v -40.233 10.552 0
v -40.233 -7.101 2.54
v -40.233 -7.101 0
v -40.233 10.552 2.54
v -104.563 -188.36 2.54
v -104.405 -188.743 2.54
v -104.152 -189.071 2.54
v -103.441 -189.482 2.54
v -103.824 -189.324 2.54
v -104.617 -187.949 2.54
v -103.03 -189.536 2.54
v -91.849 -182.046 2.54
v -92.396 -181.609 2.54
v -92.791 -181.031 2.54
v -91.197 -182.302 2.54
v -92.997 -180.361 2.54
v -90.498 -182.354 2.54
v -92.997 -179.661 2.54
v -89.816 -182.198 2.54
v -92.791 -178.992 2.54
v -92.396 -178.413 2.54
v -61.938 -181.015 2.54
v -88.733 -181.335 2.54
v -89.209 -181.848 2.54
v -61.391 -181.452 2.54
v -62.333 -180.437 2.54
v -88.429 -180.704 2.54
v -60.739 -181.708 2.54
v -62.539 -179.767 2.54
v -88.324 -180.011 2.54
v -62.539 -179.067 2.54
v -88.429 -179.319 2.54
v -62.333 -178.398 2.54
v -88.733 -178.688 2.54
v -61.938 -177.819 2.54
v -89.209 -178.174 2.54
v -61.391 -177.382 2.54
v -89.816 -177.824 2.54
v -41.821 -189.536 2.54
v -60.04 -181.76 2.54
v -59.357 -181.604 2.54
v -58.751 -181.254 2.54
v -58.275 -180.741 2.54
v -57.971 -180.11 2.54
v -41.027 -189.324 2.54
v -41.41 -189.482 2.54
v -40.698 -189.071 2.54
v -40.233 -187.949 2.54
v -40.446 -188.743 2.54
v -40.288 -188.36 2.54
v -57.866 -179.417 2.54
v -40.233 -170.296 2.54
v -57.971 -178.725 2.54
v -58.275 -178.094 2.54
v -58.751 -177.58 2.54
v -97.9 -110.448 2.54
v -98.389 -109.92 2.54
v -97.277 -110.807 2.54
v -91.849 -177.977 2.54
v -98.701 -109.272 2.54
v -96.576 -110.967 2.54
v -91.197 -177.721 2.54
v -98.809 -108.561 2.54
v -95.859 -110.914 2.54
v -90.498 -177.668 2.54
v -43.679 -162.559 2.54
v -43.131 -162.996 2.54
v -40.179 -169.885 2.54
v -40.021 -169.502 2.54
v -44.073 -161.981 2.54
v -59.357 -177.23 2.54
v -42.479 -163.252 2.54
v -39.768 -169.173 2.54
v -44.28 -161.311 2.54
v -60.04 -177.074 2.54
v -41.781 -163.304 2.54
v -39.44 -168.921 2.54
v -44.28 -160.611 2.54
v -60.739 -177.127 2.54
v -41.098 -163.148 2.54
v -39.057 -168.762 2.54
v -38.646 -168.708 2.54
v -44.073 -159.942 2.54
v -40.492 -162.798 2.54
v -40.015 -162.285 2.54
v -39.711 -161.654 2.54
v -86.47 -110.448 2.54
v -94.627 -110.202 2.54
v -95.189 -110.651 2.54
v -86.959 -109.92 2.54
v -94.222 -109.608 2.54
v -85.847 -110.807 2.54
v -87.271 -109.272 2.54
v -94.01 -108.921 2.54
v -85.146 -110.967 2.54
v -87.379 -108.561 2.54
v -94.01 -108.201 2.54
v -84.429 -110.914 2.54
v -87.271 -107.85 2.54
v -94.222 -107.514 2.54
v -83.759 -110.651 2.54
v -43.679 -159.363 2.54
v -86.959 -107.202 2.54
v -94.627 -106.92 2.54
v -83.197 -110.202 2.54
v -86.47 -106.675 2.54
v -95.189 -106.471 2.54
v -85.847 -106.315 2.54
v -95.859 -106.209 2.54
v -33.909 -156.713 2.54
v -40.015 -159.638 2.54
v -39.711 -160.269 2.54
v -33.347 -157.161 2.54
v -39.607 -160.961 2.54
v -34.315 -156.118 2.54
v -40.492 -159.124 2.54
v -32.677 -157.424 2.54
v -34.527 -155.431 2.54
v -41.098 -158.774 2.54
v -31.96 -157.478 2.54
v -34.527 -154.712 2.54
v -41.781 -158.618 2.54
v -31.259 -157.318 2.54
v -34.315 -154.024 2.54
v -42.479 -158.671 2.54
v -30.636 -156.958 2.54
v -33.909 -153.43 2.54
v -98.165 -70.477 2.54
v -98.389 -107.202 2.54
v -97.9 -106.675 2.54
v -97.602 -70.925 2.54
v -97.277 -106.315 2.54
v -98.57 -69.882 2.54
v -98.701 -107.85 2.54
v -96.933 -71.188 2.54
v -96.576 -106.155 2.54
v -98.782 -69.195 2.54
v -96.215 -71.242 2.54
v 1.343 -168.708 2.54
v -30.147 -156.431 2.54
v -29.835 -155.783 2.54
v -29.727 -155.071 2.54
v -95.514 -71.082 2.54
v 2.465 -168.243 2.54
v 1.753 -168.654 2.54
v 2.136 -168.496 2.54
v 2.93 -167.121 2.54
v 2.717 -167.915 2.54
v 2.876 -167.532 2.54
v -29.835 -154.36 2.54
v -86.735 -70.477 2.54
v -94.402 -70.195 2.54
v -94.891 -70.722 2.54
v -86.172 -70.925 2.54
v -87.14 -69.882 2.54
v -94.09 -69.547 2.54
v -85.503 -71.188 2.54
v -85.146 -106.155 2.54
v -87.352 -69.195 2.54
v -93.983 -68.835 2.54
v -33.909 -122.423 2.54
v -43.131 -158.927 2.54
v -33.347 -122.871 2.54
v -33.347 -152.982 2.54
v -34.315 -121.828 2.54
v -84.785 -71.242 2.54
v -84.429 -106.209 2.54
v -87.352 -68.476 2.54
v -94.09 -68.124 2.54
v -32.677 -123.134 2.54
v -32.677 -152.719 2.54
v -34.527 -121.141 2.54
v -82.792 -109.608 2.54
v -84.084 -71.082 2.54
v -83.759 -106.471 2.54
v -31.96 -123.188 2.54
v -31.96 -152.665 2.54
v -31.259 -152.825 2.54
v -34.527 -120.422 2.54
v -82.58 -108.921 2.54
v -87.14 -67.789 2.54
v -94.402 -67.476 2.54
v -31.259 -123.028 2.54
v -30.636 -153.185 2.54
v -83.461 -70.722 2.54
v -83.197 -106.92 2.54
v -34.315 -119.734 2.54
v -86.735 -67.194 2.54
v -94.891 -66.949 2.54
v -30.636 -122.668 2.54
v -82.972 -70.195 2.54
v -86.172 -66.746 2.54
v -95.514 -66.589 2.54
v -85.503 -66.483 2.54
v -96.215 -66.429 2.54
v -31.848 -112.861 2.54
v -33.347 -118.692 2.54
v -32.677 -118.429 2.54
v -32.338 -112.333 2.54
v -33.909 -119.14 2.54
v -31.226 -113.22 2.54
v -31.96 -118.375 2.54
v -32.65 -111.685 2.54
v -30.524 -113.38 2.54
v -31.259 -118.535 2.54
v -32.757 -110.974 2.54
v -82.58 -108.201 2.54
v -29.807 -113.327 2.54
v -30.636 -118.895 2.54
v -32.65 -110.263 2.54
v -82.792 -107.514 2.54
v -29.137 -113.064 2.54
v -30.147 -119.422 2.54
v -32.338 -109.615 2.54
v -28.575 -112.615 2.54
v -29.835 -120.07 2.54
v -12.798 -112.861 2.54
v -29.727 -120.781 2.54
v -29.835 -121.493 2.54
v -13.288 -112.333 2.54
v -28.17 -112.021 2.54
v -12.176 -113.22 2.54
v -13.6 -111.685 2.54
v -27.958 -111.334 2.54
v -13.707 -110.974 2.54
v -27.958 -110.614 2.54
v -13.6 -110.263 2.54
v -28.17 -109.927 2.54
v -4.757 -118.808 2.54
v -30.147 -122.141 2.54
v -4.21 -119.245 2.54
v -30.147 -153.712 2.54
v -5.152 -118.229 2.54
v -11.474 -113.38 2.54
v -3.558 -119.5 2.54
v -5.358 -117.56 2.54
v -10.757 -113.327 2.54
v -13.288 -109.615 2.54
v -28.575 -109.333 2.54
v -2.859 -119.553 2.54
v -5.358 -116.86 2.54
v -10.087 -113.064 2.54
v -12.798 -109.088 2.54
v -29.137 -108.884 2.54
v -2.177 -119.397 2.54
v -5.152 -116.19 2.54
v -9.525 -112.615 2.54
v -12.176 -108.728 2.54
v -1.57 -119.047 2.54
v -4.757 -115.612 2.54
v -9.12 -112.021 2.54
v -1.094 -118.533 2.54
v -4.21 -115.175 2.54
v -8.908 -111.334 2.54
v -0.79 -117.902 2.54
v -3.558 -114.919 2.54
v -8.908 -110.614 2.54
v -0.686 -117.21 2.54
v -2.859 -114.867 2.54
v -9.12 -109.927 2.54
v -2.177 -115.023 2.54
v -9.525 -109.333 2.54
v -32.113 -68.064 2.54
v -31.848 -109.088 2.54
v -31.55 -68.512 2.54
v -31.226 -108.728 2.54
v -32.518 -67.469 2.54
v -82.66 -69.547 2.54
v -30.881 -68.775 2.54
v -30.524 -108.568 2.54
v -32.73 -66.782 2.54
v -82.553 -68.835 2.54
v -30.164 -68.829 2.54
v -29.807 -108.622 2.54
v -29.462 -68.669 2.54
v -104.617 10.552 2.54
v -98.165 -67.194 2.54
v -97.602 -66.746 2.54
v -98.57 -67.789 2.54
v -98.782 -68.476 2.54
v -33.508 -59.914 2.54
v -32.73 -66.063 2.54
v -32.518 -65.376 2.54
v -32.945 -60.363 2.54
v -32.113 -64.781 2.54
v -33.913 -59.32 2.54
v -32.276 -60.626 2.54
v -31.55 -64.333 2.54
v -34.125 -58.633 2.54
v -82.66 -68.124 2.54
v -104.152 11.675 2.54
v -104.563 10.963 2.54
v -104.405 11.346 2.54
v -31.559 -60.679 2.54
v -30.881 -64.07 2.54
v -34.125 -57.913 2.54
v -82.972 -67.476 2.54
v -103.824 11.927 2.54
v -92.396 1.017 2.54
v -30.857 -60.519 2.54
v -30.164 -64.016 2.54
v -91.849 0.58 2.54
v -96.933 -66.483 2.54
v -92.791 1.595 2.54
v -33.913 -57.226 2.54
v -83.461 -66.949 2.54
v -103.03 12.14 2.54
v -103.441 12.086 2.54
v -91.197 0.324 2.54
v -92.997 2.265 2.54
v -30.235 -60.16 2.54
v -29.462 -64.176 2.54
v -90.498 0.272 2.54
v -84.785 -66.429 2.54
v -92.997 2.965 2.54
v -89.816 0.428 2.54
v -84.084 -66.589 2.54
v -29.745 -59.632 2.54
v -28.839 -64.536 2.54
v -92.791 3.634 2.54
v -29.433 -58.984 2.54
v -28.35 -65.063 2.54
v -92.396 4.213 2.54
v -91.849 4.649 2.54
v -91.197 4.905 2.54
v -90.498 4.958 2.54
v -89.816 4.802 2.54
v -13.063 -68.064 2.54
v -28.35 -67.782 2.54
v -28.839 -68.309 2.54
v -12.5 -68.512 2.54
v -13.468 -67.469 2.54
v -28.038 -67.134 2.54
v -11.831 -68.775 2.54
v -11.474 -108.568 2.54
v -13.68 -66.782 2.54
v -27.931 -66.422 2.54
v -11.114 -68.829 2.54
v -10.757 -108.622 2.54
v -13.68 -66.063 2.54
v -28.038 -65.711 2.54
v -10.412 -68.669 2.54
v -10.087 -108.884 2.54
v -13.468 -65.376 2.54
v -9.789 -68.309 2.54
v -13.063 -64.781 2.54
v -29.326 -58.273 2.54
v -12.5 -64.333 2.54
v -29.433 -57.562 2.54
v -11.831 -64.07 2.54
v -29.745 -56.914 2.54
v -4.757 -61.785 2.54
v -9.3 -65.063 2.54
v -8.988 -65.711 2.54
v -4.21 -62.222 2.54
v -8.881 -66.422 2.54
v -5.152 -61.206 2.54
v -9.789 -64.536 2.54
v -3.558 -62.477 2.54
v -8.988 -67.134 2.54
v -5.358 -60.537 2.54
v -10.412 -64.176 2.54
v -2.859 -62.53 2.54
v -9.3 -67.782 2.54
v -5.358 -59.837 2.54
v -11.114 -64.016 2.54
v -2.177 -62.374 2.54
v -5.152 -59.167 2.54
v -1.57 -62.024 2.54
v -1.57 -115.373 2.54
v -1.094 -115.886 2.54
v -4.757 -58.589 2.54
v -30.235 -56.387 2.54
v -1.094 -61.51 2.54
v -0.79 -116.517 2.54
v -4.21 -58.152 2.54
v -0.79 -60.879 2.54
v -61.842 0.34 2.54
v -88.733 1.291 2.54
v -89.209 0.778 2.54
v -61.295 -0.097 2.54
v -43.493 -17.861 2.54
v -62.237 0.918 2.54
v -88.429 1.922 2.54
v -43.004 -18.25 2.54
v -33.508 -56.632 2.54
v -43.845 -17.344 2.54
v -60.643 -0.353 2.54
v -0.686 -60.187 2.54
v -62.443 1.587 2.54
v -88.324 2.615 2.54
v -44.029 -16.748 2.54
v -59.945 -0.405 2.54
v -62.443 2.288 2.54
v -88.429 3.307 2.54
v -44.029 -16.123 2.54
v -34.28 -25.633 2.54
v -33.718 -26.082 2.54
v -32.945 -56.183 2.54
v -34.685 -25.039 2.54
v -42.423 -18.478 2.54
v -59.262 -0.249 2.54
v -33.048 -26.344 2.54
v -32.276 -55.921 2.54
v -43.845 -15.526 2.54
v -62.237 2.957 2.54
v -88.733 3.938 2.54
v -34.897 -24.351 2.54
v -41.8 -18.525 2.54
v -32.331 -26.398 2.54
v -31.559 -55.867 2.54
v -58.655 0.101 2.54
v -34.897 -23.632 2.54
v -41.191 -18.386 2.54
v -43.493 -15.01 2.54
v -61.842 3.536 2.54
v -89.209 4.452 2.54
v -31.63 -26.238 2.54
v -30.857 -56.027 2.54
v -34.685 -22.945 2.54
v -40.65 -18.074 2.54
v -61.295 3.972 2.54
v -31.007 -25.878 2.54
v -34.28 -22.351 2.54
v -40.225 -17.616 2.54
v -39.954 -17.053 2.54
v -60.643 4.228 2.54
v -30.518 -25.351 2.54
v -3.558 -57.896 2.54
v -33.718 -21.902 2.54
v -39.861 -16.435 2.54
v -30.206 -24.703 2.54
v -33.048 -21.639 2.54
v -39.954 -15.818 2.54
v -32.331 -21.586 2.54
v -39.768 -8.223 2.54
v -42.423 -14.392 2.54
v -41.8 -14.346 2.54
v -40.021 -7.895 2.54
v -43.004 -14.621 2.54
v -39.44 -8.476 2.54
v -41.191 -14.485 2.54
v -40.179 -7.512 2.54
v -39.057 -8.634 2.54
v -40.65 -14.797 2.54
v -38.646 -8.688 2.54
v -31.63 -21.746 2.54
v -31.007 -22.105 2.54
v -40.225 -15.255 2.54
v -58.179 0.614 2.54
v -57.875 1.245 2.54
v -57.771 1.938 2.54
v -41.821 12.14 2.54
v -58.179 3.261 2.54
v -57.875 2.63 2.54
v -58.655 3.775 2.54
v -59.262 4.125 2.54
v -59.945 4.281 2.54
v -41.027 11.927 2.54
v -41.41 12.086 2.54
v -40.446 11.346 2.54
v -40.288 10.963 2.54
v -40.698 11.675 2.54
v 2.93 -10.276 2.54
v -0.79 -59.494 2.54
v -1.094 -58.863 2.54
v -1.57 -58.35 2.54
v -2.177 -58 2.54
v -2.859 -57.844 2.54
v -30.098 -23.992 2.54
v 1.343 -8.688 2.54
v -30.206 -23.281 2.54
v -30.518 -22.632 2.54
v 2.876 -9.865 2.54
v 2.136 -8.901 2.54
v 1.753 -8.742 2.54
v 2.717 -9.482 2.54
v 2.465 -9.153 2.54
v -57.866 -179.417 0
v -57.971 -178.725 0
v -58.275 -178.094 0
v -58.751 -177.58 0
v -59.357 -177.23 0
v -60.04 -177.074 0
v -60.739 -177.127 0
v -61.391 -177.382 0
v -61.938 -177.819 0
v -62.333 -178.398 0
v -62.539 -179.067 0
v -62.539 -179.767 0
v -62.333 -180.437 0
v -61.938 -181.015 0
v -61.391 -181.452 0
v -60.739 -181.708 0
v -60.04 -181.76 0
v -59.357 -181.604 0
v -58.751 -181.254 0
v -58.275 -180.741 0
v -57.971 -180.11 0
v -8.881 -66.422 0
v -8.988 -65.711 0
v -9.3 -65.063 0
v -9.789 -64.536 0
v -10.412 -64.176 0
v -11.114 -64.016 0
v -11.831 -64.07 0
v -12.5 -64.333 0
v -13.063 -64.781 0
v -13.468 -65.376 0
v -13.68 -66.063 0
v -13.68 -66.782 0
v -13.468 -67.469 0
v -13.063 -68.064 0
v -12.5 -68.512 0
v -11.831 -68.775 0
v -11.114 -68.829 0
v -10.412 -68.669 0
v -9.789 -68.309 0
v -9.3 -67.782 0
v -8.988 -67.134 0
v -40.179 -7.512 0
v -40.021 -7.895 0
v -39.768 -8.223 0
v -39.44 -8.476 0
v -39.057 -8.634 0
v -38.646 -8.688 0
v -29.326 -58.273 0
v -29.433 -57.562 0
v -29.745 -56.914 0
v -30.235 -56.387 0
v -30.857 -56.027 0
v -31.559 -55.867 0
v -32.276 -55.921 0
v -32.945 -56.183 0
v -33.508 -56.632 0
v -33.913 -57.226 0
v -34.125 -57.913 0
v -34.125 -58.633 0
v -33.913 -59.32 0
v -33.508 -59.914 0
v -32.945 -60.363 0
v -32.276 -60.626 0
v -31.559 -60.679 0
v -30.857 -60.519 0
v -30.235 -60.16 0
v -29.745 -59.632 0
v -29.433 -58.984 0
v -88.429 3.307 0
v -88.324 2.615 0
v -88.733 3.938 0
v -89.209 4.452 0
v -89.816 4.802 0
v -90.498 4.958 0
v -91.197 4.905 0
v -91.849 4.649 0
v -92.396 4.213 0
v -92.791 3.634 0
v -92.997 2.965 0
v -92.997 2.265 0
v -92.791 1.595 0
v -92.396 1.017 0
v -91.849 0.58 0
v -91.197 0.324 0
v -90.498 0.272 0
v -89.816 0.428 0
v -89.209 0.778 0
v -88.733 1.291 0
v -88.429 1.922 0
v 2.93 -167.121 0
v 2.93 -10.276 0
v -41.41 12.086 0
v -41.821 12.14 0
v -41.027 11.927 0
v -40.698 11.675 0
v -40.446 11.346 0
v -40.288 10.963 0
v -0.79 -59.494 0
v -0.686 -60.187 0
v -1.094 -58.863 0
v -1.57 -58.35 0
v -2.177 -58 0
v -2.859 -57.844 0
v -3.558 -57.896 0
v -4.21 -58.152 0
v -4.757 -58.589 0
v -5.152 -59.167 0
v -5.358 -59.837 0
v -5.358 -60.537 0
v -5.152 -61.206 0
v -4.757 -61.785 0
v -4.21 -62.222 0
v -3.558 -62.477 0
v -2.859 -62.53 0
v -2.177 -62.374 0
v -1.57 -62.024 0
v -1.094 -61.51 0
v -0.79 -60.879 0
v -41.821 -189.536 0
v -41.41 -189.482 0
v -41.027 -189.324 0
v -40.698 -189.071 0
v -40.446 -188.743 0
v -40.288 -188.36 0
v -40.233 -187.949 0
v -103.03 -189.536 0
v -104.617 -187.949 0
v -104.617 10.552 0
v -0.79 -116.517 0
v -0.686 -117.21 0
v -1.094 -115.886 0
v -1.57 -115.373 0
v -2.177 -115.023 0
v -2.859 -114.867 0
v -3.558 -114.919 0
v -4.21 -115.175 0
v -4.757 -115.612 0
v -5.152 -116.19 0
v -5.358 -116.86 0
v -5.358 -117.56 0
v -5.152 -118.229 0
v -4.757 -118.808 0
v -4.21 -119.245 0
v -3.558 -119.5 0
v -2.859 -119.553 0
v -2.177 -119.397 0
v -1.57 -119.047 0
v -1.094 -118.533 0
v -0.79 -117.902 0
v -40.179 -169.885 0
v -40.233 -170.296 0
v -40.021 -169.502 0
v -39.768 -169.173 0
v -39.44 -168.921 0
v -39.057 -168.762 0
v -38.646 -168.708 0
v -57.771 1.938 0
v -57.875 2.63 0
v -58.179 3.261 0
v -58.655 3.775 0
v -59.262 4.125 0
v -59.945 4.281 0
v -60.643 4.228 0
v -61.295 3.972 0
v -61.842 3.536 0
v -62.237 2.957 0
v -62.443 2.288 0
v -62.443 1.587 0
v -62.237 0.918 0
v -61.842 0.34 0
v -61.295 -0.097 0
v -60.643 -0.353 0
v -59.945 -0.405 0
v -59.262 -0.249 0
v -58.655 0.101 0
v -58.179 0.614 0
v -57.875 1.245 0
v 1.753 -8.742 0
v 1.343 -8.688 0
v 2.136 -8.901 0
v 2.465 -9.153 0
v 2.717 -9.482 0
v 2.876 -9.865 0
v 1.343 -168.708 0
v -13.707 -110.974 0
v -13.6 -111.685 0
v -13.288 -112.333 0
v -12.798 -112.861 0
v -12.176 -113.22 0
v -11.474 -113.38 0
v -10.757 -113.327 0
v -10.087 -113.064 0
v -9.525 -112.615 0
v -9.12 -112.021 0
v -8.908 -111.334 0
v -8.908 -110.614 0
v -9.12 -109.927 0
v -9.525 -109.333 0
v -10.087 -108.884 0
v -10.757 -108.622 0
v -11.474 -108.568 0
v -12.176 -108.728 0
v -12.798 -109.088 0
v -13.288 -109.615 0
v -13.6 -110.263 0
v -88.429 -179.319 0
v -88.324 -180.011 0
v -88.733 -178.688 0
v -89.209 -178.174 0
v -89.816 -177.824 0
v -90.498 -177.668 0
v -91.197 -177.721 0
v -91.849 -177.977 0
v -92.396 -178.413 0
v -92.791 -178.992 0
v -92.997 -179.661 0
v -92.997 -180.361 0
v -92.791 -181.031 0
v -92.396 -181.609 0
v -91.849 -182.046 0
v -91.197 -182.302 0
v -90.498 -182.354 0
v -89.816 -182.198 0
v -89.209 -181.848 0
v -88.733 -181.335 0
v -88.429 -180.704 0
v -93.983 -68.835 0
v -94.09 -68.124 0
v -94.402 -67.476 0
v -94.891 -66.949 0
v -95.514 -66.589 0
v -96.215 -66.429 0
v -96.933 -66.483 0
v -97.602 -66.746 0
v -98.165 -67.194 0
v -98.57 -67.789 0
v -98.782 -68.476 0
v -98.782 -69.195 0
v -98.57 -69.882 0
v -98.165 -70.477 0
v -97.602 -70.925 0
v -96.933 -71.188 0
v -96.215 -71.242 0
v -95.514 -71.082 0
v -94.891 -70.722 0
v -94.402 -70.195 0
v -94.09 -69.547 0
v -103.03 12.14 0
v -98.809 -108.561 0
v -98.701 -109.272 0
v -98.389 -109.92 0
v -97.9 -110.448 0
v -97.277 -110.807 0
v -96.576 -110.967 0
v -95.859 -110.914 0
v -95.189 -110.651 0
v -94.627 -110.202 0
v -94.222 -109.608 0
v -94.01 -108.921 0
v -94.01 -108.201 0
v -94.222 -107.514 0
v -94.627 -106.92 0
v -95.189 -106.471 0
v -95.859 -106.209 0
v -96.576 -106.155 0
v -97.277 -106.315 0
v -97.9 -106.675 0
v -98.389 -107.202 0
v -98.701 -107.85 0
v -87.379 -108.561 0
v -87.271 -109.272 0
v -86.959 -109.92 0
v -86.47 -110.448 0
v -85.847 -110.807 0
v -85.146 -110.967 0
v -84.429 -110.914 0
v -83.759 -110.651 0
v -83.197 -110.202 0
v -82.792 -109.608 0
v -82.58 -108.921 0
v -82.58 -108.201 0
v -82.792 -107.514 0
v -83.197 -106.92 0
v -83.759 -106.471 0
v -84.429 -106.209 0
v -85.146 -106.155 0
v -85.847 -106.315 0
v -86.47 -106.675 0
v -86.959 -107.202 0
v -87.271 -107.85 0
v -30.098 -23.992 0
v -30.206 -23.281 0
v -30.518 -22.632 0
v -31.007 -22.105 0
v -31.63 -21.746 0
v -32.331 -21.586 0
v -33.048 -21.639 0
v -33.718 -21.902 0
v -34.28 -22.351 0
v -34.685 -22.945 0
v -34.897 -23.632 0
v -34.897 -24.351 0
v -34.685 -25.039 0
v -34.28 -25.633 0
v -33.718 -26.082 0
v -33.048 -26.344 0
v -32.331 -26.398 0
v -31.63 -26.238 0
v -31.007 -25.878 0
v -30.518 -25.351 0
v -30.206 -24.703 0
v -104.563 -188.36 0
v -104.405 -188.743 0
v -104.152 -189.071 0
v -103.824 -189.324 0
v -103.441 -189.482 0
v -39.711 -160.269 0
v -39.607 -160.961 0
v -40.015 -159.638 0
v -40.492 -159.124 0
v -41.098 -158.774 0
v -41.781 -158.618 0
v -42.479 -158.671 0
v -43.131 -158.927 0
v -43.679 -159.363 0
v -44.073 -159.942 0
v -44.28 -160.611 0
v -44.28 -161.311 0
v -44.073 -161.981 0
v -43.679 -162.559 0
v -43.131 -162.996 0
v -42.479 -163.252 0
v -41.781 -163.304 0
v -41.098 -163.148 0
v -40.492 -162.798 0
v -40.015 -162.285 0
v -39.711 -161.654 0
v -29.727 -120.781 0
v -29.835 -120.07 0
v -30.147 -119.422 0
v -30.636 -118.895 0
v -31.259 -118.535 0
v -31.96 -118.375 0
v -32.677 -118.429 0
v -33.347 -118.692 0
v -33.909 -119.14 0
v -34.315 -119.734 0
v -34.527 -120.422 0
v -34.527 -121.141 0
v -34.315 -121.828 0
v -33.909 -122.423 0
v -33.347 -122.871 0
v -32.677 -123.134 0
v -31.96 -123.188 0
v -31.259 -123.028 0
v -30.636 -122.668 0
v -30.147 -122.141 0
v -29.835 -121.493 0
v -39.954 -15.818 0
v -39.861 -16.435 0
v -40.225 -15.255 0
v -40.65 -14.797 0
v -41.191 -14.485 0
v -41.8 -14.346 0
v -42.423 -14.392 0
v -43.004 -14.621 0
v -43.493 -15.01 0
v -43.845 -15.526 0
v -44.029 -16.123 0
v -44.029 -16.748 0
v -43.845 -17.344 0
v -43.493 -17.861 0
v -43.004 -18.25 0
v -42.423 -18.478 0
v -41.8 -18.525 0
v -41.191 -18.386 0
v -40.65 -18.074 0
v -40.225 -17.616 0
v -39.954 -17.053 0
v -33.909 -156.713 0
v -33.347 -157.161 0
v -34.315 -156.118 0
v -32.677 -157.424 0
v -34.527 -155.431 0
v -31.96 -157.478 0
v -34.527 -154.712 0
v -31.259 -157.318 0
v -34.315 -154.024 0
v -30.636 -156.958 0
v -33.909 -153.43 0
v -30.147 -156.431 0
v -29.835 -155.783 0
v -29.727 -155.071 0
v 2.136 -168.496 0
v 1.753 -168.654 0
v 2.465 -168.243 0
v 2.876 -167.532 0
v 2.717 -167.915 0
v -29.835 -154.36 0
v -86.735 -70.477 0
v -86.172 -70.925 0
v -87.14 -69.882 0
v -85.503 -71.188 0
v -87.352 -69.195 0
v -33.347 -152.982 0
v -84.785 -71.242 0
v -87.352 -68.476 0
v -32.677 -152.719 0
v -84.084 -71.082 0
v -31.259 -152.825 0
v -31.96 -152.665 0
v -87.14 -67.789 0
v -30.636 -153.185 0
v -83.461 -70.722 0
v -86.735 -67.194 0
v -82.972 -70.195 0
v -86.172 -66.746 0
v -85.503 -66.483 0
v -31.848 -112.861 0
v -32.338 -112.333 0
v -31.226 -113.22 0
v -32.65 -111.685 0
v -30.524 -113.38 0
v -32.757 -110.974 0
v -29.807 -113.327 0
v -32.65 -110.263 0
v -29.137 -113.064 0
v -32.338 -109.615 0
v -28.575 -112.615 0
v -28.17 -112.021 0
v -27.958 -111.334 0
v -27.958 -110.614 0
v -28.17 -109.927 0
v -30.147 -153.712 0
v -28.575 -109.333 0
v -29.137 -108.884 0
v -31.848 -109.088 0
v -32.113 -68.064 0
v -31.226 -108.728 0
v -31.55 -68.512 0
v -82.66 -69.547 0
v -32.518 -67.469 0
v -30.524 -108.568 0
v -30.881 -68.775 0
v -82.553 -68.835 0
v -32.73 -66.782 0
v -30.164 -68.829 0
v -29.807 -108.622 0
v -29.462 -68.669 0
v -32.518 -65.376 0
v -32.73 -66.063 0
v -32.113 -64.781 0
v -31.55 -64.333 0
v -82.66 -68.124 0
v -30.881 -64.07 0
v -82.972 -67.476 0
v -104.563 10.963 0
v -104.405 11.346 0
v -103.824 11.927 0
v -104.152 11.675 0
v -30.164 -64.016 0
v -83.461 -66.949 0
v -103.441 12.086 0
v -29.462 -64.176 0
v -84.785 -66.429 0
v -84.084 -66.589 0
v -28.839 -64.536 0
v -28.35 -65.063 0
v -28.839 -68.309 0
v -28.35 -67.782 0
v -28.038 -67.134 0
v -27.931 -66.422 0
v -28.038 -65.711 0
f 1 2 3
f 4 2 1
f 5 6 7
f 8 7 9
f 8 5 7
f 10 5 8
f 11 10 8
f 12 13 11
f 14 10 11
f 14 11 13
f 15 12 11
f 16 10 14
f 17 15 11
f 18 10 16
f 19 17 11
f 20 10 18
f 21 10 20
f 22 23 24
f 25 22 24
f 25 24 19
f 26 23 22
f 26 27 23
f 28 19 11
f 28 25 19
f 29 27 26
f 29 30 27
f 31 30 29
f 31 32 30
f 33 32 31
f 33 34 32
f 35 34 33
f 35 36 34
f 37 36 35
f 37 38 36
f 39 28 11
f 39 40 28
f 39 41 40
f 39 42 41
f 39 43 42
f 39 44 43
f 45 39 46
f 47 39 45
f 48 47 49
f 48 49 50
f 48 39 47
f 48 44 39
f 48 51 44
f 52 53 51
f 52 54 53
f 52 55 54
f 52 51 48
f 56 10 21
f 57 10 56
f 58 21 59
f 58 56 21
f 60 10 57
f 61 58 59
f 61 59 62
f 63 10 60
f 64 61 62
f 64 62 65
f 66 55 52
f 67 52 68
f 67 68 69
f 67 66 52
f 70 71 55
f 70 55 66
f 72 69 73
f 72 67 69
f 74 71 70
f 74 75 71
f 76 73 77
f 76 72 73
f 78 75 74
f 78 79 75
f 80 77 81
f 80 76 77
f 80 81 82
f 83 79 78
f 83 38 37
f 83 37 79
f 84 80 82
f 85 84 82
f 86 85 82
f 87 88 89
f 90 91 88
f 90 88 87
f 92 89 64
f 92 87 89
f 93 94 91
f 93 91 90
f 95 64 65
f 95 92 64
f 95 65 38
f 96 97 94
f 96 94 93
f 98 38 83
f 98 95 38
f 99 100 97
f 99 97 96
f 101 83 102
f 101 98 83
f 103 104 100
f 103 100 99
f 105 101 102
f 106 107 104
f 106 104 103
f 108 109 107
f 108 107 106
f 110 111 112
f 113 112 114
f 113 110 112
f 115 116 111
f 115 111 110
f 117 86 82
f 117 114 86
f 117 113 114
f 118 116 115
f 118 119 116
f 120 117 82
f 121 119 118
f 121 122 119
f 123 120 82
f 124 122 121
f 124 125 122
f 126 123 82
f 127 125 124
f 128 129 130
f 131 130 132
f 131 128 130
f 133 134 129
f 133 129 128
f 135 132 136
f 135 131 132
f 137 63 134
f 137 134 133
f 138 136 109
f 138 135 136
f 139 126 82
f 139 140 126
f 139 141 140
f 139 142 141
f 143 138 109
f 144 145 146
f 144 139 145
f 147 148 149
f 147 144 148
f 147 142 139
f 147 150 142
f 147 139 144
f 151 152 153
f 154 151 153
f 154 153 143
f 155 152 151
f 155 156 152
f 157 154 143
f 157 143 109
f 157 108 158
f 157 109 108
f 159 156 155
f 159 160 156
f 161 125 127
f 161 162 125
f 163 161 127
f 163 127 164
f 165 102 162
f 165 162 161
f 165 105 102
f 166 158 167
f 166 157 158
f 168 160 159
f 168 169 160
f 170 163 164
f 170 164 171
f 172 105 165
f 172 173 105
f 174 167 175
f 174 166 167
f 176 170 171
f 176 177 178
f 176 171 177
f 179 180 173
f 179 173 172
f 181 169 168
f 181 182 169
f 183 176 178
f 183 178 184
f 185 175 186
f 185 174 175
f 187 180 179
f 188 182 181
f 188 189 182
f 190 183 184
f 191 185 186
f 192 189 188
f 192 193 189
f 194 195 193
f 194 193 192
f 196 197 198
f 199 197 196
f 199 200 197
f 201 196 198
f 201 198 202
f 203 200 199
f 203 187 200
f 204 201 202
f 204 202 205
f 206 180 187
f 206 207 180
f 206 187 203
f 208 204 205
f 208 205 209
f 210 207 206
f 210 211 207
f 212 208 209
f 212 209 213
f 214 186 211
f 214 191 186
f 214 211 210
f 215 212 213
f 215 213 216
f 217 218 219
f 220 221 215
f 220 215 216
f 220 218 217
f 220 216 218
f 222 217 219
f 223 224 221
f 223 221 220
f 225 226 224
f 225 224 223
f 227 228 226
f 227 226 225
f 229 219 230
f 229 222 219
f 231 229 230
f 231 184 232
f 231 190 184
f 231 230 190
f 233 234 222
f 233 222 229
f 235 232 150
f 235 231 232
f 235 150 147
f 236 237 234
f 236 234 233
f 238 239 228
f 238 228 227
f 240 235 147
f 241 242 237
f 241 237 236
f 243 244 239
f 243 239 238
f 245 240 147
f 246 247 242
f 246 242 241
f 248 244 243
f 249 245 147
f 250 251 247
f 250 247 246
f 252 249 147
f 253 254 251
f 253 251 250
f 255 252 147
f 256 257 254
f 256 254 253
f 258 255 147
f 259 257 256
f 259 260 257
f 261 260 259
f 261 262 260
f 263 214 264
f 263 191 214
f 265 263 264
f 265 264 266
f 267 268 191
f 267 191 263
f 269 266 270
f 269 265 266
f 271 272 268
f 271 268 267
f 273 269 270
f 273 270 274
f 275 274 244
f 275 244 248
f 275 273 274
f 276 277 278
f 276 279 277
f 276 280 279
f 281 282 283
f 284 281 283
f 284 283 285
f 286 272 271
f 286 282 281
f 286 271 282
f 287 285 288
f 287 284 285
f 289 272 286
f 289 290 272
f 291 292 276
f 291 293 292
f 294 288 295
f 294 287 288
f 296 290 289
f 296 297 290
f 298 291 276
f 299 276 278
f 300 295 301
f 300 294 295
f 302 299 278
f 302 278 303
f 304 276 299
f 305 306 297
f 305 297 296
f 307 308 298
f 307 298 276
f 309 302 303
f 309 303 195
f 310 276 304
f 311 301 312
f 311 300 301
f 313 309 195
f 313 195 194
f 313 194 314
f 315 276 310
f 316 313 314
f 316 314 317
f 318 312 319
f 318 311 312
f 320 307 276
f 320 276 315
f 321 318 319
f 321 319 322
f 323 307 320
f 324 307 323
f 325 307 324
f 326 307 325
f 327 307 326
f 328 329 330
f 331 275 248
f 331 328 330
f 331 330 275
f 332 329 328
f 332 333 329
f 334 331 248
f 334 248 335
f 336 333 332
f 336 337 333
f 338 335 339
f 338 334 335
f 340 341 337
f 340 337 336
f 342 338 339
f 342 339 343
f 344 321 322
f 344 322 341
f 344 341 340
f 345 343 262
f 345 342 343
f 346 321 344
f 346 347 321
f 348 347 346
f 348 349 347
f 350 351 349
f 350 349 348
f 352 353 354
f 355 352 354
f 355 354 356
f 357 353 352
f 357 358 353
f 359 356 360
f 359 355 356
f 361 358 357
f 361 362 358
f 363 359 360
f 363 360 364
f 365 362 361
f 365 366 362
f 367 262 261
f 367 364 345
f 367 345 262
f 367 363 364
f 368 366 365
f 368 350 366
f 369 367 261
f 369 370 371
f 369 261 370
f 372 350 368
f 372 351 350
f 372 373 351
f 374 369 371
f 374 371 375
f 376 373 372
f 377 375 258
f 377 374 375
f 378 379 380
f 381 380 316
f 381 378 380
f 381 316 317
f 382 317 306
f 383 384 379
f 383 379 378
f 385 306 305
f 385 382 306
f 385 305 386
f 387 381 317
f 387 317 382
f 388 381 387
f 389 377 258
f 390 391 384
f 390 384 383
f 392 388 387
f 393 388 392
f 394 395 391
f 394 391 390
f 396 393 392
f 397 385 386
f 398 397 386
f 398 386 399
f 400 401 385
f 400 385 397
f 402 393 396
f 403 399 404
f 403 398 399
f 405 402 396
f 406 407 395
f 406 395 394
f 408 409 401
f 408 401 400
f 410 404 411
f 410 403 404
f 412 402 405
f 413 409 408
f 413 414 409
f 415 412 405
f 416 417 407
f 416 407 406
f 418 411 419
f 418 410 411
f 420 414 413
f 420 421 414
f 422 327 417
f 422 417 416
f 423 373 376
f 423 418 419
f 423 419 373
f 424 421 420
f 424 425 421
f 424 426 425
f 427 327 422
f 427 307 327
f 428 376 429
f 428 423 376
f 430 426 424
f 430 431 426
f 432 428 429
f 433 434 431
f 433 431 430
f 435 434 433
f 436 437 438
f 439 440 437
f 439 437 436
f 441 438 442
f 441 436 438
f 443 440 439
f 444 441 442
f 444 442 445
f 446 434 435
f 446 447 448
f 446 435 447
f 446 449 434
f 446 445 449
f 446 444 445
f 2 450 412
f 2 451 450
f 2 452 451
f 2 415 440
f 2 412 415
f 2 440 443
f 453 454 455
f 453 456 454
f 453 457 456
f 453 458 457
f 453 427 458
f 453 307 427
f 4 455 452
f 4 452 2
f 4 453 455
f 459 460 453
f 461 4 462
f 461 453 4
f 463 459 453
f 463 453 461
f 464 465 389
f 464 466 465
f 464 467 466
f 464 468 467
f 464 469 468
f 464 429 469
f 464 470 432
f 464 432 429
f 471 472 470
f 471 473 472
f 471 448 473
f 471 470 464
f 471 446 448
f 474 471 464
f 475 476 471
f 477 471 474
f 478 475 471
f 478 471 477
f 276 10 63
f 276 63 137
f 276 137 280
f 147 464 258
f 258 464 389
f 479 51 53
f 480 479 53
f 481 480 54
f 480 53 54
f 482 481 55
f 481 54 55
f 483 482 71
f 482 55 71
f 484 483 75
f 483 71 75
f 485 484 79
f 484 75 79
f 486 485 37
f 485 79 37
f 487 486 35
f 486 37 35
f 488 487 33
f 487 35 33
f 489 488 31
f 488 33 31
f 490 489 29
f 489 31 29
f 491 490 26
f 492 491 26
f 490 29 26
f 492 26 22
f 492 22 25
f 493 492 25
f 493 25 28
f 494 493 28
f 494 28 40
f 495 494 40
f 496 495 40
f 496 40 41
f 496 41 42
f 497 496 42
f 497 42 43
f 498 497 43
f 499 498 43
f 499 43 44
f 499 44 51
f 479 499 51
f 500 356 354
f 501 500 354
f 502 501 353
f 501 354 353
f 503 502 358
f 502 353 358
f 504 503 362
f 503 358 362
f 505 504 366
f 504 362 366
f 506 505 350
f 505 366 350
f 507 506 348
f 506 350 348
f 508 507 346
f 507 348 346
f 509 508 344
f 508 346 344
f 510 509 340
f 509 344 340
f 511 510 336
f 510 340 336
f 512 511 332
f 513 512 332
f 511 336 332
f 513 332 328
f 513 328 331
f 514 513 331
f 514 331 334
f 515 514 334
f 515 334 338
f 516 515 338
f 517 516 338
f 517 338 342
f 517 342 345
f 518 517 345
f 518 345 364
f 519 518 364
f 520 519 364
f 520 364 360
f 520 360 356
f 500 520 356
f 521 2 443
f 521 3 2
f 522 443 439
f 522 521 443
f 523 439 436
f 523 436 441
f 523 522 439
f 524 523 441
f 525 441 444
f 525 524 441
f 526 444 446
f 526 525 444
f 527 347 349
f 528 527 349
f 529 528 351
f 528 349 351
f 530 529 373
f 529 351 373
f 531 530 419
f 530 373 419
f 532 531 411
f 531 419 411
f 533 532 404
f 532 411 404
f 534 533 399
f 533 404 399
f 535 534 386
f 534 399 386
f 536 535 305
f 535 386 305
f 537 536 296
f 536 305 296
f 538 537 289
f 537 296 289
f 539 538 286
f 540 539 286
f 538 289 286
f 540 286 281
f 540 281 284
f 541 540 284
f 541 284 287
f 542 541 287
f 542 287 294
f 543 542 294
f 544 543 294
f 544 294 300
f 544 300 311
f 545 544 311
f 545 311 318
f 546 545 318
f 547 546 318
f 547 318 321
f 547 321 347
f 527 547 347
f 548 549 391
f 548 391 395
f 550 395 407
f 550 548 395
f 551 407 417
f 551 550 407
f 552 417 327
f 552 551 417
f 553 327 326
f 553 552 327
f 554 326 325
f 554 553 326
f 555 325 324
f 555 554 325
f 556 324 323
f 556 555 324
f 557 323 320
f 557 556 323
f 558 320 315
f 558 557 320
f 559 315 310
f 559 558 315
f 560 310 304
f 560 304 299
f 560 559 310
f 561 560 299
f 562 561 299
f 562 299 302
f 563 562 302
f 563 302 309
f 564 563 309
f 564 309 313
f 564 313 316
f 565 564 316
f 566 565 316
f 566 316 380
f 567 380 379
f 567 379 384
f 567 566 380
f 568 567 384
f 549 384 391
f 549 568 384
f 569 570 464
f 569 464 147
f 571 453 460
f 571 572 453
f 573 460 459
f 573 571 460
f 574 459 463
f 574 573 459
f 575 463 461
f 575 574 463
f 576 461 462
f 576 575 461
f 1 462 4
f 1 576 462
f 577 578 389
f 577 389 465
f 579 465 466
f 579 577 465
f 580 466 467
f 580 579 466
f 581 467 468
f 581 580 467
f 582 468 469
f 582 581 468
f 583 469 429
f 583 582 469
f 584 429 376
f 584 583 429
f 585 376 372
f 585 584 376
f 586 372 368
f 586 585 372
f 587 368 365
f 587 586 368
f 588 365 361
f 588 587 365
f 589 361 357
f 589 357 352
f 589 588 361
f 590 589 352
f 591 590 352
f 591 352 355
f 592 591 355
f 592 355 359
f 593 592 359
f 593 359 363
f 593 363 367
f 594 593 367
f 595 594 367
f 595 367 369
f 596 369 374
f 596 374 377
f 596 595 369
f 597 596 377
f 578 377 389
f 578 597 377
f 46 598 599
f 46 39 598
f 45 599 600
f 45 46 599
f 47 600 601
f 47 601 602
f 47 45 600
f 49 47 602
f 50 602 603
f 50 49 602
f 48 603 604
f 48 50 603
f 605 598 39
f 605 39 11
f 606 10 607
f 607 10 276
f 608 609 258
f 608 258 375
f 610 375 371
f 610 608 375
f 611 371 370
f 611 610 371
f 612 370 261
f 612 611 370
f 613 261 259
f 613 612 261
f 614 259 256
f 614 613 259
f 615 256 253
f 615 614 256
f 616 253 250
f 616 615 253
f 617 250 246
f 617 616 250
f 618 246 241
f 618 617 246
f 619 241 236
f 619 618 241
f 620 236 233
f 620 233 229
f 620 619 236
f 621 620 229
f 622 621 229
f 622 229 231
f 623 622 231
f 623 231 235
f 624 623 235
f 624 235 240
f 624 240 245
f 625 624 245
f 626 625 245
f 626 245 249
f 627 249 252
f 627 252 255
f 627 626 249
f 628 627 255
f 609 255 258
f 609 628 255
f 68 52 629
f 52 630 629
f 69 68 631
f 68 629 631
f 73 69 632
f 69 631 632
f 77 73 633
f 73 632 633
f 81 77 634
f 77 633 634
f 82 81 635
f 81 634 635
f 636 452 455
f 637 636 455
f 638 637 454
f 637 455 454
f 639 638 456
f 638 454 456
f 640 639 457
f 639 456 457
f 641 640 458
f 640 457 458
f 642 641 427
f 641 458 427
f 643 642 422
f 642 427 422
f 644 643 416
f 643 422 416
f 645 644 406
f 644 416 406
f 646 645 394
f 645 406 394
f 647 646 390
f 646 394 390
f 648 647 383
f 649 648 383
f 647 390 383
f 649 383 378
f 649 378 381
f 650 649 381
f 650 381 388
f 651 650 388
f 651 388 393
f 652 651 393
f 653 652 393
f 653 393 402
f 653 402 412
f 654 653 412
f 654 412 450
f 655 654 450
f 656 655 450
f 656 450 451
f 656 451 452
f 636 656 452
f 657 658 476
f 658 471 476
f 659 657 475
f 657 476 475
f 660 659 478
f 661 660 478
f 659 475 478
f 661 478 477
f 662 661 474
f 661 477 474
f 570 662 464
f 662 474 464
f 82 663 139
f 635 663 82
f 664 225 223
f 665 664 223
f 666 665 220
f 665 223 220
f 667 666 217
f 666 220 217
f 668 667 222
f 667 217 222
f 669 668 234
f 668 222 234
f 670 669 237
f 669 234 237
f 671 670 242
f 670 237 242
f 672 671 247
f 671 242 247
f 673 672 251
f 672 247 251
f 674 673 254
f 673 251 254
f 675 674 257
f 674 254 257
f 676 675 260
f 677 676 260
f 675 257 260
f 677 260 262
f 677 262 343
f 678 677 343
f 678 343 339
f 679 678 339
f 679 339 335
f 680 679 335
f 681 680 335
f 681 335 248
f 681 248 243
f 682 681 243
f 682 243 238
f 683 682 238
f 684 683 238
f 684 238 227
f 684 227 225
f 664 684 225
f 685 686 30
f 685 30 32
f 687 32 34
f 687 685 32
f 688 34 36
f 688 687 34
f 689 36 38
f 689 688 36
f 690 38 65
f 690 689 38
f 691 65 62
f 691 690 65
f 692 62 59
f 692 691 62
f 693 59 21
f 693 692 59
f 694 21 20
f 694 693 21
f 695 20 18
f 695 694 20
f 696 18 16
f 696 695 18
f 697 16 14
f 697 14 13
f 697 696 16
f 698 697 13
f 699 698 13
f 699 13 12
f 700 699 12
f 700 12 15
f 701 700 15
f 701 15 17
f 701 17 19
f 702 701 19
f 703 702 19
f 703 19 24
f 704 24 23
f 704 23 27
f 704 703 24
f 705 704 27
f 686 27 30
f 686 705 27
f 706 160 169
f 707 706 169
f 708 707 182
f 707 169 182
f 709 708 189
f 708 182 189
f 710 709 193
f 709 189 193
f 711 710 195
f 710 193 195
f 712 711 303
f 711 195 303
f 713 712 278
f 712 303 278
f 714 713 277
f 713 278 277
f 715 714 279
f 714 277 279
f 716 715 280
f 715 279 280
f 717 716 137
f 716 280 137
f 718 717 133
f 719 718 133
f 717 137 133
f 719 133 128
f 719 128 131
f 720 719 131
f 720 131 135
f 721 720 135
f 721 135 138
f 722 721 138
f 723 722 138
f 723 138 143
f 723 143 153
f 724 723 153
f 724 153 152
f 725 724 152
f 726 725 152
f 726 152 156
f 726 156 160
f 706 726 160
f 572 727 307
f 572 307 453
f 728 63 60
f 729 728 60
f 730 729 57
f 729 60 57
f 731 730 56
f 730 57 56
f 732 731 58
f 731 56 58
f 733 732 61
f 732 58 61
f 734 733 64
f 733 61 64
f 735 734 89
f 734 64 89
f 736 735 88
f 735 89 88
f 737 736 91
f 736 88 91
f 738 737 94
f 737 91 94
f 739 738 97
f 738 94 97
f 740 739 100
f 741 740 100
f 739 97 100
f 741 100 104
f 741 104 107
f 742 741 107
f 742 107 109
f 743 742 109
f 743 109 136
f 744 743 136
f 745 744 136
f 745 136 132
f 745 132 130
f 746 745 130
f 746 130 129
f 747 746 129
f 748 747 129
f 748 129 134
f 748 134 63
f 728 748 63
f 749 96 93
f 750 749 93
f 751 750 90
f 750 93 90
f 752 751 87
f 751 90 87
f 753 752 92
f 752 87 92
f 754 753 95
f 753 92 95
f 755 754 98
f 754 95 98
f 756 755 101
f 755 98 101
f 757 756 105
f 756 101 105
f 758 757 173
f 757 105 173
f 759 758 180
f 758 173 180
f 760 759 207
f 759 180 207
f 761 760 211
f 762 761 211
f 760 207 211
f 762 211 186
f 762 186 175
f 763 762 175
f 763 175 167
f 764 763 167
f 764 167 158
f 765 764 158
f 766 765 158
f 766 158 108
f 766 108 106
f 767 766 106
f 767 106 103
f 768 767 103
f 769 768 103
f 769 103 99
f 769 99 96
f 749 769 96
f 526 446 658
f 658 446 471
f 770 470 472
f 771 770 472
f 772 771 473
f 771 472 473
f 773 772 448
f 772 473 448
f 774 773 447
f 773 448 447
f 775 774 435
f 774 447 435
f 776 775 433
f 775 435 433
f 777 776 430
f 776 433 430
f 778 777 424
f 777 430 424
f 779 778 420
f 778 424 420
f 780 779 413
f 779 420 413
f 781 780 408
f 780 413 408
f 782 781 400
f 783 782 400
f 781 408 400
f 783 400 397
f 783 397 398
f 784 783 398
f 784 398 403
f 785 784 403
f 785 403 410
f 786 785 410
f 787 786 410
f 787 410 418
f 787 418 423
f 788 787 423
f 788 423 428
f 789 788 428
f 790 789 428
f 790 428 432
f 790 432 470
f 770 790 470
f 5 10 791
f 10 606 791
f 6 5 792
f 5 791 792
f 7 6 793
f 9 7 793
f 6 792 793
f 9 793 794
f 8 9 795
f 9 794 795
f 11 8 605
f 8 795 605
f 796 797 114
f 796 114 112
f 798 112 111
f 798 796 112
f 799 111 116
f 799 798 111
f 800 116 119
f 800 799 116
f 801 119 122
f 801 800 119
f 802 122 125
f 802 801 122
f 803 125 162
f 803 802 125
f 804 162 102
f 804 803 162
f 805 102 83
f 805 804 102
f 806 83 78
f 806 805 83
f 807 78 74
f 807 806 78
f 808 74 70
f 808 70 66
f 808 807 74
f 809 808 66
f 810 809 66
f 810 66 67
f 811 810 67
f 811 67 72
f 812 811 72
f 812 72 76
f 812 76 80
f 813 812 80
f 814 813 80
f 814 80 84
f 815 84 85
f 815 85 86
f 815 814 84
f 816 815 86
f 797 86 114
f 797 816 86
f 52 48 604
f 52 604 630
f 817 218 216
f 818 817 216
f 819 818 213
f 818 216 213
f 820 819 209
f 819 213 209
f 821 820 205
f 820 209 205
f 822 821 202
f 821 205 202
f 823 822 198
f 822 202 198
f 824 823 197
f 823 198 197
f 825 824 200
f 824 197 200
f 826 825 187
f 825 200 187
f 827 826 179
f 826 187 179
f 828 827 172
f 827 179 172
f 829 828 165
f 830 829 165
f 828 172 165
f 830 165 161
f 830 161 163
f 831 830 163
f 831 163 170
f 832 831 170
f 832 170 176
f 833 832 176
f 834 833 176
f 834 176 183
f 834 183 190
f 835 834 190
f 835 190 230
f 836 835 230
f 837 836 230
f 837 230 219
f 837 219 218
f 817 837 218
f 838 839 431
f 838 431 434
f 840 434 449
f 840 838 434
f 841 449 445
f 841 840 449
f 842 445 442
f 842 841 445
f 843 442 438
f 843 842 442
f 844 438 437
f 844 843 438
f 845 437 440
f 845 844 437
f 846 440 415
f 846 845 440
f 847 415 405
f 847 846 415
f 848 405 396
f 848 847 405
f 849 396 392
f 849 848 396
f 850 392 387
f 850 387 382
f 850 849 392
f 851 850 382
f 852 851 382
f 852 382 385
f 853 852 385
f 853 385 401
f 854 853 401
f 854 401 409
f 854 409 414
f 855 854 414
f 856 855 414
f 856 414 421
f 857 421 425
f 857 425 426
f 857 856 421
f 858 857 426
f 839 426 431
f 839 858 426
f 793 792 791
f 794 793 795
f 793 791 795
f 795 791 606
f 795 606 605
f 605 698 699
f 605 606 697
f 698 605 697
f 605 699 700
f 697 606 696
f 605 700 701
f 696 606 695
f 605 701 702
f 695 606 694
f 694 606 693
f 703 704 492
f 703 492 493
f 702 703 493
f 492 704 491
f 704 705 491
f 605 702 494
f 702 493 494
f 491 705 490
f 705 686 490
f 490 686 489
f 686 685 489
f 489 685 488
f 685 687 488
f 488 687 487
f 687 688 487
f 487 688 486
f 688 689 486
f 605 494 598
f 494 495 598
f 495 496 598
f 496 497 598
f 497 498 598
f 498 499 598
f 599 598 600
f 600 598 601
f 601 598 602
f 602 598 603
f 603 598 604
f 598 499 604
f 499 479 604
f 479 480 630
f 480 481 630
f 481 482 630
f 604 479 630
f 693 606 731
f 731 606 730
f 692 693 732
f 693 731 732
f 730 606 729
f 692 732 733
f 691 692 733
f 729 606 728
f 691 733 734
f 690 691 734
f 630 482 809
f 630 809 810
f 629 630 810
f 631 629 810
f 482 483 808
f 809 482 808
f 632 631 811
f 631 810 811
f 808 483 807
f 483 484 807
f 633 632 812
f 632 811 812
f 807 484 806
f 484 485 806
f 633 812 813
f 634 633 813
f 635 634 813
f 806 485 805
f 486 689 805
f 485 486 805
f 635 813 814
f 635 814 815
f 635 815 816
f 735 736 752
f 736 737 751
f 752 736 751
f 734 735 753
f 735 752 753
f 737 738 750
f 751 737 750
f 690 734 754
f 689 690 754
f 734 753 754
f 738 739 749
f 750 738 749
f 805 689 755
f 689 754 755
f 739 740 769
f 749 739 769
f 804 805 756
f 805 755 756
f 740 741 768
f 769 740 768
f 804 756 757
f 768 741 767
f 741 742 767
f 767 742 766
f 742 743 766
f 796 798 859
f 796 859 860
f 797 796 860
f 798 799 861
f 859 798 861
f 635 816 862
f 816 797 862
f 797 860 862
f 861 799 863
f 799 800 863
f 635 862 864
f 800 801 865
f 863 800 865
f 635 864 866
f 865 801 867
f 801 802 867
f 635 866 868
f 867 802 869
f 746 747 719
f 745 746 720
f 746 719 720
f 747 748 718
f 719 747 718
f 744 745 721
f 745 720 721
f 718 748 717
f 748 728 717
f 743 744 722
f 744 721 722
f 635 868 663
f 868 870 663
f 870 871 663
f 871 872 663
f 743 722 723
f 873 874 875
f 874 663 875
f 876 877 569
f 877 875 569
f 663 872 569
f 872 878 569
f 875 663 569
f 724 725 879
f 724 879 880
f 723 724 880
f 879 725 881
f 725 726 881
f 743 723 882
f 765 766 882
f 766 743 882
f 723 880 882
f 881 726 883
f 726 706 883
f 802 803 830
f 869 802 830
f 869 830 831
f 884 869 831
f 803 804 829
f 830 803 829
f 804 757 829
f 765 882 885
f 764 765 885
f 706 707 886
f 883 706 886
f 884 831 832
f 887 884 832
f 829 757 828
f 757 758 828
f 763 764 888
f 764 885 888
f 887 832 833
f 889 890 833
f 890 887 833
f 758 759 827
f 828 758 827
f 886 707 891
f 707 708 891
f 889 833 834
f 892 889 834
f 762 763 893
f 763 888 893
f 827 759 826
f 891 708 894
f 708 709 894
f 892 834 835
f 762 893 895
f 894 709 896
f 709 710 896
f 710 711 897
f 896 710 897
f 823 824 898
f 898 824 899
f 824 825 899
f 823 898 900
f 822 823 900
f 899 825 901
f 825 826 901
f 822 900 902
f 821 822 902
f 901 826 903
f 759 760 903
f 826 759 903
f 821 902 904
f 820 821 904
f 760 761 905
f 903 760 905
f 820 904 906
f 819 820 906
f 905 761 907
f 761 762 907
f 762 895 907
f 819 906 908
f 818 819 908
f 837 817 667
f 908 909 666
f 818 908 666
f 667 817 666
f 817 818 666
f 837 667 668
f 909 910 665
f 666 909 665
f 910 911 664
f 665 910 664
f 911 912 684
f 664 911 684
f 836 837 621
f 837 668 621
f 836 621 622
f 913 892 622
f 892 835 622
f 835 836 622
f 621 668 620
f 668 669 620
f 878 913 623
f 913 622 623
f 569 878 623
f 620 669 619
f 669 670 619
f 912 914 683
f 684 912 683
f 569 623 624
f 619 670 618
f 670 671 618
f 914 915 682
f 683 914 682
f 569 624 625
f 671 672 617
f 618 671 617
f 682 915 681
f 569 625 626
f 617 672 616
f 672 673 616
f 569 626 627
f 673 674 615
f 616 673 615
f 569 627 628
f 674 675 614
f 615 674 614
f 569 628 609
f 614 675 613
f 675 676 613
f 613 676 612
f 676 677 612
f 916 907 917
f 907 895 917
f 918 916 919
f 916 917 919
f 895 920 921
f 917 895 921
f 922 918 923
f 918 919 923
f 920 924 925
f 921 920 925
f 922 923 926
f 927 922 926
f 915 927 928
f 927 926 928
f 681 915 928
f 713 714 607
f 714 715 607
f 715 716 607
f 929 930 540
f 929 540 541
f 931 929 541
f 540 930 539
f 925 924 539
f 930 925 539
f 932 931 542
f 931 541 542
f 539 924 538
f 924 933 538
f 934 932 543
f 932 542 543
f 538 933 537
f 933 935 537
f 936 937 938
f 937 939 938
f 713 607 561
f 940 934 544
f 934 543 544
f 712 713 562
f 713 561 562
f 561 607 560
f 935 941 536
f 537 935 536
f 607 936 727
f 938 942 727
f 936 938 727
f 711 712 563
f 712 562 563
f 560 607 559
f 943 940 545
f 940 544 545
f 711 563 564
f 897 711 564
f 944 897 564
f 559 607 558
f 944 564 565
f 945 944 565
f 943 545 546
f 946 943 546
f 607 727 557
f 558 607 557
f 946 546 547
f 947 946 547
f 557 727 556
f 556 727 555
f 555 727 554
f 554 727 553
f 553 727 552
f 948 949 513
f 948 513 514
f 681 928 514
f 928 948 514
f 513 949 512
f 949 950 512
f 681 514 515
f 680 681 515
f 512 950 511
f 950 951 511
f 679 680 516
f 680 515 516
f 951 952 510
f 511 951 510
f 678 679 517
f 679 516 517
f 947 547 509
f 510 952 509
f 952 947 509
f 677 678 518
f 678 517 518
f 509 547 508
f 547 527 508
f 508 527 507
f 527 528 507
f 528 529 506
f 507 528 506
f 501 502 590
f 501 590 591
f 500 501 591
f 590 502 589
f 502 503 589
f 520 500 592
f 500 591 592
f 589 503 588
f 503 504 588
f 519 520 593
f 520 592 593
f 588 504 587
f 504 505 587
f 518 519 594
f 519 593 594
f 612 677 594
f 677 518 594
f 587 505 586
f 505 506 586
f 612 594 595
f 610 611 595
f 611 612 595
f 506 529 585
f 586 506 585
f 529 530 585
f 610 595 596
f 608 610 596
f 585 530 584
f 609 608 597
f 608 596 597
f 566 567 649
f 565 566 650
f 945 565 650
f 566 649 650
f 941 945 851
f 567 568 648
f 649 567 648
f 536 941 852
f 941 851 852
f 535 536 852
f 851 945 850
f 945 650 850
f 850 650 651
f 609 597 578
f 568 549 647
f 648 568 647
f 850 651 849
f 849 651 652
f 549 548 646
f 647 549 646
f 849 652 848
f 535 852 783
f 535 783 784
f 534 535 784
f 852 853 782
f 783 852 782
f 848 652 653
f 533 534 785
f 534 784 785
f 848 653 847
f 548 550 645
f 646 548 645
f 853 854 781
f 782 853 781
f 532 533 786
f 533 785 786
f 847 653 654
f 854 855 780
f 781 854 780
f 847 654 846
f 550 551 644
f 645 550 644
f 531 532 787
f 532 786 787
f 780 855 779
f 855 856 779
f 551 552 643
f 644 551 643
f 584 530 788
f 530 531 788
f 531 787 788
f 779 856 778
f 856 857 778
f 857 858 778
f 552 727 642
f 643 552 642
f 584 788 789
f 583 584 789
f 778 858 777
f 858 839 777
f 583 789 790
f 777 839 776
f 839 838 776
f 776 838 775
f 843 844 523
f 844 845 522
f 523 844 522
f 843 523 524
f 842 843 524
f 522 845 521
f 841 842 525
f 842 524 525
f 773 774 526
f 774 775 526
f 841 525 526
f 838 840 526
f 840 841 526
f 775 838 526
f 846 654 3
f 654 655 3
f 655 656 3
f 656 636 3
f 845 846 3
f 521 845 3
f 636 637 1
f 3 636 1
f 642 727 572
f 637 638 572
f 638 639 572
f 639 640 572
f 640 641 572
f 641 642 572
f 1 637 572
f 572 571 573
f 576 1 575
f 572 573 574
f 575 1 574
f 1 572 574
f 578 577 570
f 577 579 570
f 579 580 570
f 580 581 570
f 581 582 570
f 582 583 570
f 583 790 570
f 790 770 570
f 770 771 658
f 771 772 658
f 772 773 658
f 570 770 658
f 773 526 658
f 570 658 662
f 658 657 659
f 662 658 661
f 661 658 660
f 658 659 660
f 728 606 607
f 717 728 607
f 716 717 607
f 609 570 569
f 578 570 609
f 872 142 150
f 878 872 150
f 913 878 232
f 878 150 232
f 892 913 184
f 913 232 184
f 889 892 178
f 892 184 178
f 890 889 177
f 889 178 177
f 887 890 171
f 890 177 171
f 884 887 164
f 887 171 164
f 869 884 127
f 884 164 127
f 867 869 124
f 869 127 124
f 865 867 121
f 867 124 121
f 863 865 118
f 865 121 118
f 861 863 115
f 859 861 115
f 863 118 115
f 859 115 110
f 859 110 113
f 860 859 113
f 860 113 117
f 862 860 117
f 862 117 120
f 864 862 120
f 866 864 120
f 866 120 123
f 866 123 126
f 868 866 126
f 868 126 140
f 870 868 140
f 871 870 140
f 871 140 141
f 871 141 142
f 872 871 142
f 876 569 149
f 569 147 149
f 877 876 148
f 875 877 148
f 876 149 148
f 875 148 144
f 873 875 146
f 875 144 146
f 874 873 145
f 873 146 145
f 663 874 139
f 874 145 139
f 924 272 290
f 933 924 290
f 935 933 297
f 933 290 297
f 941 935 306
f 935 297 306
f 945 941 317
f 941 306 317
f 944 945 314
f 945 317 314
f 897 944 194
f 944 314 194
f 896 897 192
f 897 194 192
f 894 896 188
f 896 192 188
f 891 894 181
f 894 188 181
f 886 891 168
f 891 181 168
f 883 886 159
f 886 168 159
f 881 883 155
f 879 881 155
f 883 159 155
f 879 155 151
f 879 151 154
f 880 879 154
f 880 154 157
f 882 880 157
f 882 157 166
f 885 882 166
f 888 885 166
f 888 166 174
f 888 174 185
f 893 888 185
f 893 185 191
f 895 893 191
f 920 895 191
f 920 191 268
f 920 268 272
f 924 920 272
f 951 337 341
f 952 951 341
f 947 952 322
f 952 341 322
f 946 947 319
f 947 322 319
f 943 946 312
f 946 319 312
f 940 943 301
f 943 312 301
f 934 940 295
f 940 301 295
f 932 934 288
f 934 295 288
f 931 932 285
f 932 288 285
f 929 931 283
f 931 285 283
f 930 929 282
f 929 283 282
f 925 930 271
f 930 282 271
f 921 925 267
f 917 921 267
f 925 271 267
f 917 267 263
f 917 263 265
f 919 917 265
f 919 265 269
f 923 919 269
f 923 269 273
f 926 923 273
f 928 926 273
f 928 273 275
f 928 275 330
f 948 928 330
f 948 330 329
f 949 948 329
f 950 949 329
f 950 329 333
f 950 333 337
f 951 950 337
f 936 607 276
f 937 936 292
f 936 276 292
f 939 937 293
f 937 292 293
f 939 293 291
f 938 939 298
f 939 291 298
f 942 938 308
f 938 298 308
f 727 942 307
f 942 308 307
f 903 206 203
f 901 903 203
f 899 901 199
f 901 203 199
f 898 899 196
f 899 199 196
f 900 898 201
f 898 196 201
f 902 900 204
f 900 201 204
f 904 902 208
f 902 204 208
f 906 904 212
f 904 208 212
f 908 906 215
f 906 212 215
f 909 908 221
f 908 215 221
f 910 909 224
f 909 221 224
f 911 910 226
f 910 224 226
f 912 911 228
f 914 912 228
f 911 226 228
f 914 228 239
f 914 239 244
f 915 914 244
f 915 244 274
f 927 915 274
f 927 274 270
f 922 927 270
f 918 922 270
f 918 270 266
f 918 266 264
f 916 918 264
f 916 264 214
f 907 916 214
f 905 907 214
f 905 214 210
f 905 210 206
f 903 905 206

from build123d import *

# Parameters (mm, degrees)
SKETCH2_R               = 2.3495
SKETCH2_R_2             = 2.0955
BOSS_EXTRUDE1_DEPTH     = 2.54
SKETCH3_W               = 31.75
SKETCH3_H               = 44.323
BOSS_EXTRUDE2_DEPTH     = 2.54
SKETCH4_R               = 2.413
CUT_EXTRUDE1_DEPTH      = 238.743265275
SKETCH5_R               = 2.413
CUT_EXTRUDE2_DEPTH      = 238.743265275
SKETCH6_R               = 2.413
CUT_EXTRUDE3_DEPTH      = 238.743265275
SKETCH7_R               = 2.413
CUT_EXTRUDE4_DEPTH      = 238.743265275
SKETCH8_W               = 7.994763
SKETCH8_H               = 21.113506736
SKETCH8_W_2             = 21.493659396
SKETCH8_H_2             = 28.960940125
CUT_EXTRUDE5_DEPTH      = 238.743265275
CUT_EXTRUDE6_DEPTH      = 238.743265275
CUT_EXTRUDE6_DEPTH_BACK = 238.743265275
CUT_EXTRUDE7_REACH      = 206.142
SKETCH10_R              = 2.3495
FILLET1_R               = 1.5875


with BuildPart() as part:
    # Sketch2 → Boss-Extrude1 (new body)
    with BuildSketch(Plane(origin=(0, 0, 0), x_dir=(-1, 0, 0), z_dir=(0, 0, 1))):
        Polygon((-2.930050059, 168.708281075), (38.709428475, 168.708281075), (38.709428475, 189.536281075), (143.497061781, 189.536281075), (104.617436481, 110.859781075), (72.867436481, 110.859781075), (72.867436481, 66.536781075), (104.617436481, 66.536781075), (143.497061781, -12.139718925), (38.709428475, -12.139718925), (38.709428475, 8.688281075), (-2.930050059, 8.688281075), align=None)
        with Locations(Location((41.95655448, 160.961281075, 0), (0, 0, 180))):
            Circle(SKETCH2_R, mode=Mode.SUBTRACT)
        with Locations(Location((90.673911143, 180.011281075, 0), (0, 0, 180))):
            Circle(SKETCH2_R, mode=Mode.SUBTRACT)
        with Locations(Location((90.673911143, -2.614718925, 0), (0, 0, 180))):
            Circle(SKETCH2_R, mode=Mode.SUBTRACT)
        with Locations(Location((3.035061781, 117.209781075, 0), (0, 0, 180))):
            Circle(SKETCH2_R, mode=Mode.SUBTRACT)
        with Locations(Location((3.035061781, 60.186781075, 0), (0, 0, 180))):
            Circle(SKETCH2_R, mode=Mode.SUBTRACT)
        with Locations(Location((41.95655448, 16.435281075, 0), (0, 0, 180))):
            Circle(SKETCH2_R_2, mode=Mode.SUBTRACT)
    extrude(amount=BOSS_EXTRUDE1_DEPTH)

    # Sketch3 → Boss-Extrude2 (add)
    with BuildSketch(Plane.XY.offset(2.54)):
        with Locations((-88.742436481, -88.698281075)):
            Rectangle(SKETCH3_W, SKETCH3_H)
    extrude(amount=-BOSS_EXTRUDE2_DEPTH)

    # Sketch4 → Cut-Extrude1 (cut, through all)
    with BuildSketch(Plane.XY.offset(2.54)):
        with Locations((-96.39567787, -68.835481075)):
            Circle(SKETCH4_R)
        with Locations((-84.96567787, -68.835481075)):
            Circle(SKETCH4_R)
        with Locations((-30.343949941, -66.422481075)):
            Circle(SKETCH4_R)
        with Locations((-11.293949941, -66.422481075)):
            Circle(SKETCH4_R)
        with Locations(Location((-11.293949941, -110.974081075, 0), (0, 0, 180))):
            Circle(SKETCH4_R)
        with Locations(Location((-30.343949941, -110.974081075, 0), (0, 0, 180))):
            Circle(SKETCH4_R)
        with Locations(Location((-84.96567787, -108.561081075, 0), (0, 0, 180))):
            Circle(SKETCH4_R)
        with Locations(Location((-96.39567787, -108.561081075, 0), (0, 0, 180))):
            Circle(SKETCH4_R)
    extrude(amount=-CUT_EXTRUDE1_DEPTH, mode=Mode.SUBTRACT)

    # Sketch5 → Cut-Extrude2 (cut, through all)
    with BuildSketch(Plane.XY.offset(2.54)):
        with Locations((-31.738991634, -58.273080522)):
            Circle(SKETCH5_R)
    extrude(amount=-CUT_EXTRUDE2_DEPTH, mode=Mode.SUBTRACT)

    # Sketch6 → Cut-Extrude3 (cut, through all)
    with BuildSketch(Plane.XY.offset(2.54)):
        with Locations((-32.511395831, -23.991781075)):
            Circle(SKETCH6_R)
    extrude(amount=-CUT_EXTRUDE3_DEPTH, mode=Mode.SUBTRACT)

    # Sketch7 → Cut-Extrude4 (cut, through all)
    with BuildSketch(Plane.XY.offset(2.54)):
        with Locations((-32.140467993, -155.071444629)):
            Circle(SKETCH7_R)
        with Locations((-32.140467993, -120.781444629)):
            Circle(SKETCH7_R)
    extrude(amount=-CUT_EXTRUDE4_DEPTH, mode=Mode.SUBTRACT)

    # Sketch8 → Cut-Extrude5 (cut, through all)
    with BuildSketch(Plane.XY.offset(2.54)):
        with Locations((-36.236046975, 1.868472293)):
            Rectangle(SKETCH8_W, SKETCH8_H)
        with Locations((-29.486598777, -183.188751137)):
            Rectangle(SKETCH8_W_2, SKETCH8_H_2)
    extrude(amount=-CUT_EXTRUDE5_DEPTH, mode=Mode.SUBTRACT)

    # Sketch9 → Cut-Extrude6 (cut, two sides: drawn at the far end of the back side and taken through both)
    with BuildSketch(Plane.XY.offset(2.54).offset(-CUT_EXTRUDE6_DEPTH_BACK)):
        Polygon((-104.617436481, -66.536781075), (-104.617436481, 15.636566552), (-183.179161499, 15.636566552), (-188.262141255, -199.721259961), (-104.617436481, -202.664037714), align=None)
    extrude(amount=CUT_EXTRUDE6_DEPTH + CUT_EXTRUDE6_DEPTH_BACK, mode=Mode.SUBTRACT)

    # Sketch10 → Cut-Extrude7 (cut, up to next)
    with BuildSketch(Plane(origin=(-13.551580143, -6.849856516, 2.54), x_dir=(-0.9999147240311792, 0.01305927508136085, 0), z_dir=(0, 0, 1)), mode=Mode.PRIVATE) as cut_extrude7_sk1:
        with Locations(Location((46.679311403, -8.178590001, 0), (0, 0, 180.748262615))):
            Circle(SKETCH10_R)
    cut_extrude7_tool1 = extrude(cut_extrude7_sk1.sketch, amount=-CUT_EXTRUDE7_REACH, mode=Mode.PRIVATE) & part.part
    # Sketch10 → Cut-Extrude7 (cut, up to next)
    with BuildSketch(Plane(origin=(-13.551580143, -6.849856516, 2.54), x_dir=(-0.9999147240311792, 0.01305927508136085, 0), z_dir=(0, 0, 1)), mode=Mode.PRIVATE) as cut_extrude7_sk2:
        with Locations(Location((44.406688666, 173.16194469, 0), (0, 0, 180.748262615))):
            Circle(SKETCH10_R)
    cut_extrude7_tool2 = extrude(cut_extrude7_sk2.sketch, amount=-CUT_EXTRUDE7_REACH, mode=Mode.PRIVATE) & part.part
    add(cut_extrude7_tool1.solids().sort_by_distance((-60.120104, 1.937634, 2.54))[0], mode=Mode.SUBTRACT)
    add(cut_extrude7_tool2.solids().sort_by_distance((-60.215851, -179.417115, 2.54))[0], mode=Mode.SUBTRACT)

    # Fillet1
    fillet1_edges = [part.edges().sort_by_distance(p)[0] for p in [
        (-40.233428475, -189.536281075, 1.27),
        (-40.233428475, 12.139718925, 1.27),
        (-40.233428475, -8.688281075, 1.27),
        (-40.233428475, -168.708281075, 1.27),
        (-104.617436481, -189.536281075, 1.27),
        (-104.617436481, 12.139718925, 1.27),
        (2.930050059, -168.708281075, 1.27),
        (2.930050059, -8.688281075, 1.27),
    ]]
    fillet(fillet1_edges, radius=FILLET1_R)


solid = part.part
